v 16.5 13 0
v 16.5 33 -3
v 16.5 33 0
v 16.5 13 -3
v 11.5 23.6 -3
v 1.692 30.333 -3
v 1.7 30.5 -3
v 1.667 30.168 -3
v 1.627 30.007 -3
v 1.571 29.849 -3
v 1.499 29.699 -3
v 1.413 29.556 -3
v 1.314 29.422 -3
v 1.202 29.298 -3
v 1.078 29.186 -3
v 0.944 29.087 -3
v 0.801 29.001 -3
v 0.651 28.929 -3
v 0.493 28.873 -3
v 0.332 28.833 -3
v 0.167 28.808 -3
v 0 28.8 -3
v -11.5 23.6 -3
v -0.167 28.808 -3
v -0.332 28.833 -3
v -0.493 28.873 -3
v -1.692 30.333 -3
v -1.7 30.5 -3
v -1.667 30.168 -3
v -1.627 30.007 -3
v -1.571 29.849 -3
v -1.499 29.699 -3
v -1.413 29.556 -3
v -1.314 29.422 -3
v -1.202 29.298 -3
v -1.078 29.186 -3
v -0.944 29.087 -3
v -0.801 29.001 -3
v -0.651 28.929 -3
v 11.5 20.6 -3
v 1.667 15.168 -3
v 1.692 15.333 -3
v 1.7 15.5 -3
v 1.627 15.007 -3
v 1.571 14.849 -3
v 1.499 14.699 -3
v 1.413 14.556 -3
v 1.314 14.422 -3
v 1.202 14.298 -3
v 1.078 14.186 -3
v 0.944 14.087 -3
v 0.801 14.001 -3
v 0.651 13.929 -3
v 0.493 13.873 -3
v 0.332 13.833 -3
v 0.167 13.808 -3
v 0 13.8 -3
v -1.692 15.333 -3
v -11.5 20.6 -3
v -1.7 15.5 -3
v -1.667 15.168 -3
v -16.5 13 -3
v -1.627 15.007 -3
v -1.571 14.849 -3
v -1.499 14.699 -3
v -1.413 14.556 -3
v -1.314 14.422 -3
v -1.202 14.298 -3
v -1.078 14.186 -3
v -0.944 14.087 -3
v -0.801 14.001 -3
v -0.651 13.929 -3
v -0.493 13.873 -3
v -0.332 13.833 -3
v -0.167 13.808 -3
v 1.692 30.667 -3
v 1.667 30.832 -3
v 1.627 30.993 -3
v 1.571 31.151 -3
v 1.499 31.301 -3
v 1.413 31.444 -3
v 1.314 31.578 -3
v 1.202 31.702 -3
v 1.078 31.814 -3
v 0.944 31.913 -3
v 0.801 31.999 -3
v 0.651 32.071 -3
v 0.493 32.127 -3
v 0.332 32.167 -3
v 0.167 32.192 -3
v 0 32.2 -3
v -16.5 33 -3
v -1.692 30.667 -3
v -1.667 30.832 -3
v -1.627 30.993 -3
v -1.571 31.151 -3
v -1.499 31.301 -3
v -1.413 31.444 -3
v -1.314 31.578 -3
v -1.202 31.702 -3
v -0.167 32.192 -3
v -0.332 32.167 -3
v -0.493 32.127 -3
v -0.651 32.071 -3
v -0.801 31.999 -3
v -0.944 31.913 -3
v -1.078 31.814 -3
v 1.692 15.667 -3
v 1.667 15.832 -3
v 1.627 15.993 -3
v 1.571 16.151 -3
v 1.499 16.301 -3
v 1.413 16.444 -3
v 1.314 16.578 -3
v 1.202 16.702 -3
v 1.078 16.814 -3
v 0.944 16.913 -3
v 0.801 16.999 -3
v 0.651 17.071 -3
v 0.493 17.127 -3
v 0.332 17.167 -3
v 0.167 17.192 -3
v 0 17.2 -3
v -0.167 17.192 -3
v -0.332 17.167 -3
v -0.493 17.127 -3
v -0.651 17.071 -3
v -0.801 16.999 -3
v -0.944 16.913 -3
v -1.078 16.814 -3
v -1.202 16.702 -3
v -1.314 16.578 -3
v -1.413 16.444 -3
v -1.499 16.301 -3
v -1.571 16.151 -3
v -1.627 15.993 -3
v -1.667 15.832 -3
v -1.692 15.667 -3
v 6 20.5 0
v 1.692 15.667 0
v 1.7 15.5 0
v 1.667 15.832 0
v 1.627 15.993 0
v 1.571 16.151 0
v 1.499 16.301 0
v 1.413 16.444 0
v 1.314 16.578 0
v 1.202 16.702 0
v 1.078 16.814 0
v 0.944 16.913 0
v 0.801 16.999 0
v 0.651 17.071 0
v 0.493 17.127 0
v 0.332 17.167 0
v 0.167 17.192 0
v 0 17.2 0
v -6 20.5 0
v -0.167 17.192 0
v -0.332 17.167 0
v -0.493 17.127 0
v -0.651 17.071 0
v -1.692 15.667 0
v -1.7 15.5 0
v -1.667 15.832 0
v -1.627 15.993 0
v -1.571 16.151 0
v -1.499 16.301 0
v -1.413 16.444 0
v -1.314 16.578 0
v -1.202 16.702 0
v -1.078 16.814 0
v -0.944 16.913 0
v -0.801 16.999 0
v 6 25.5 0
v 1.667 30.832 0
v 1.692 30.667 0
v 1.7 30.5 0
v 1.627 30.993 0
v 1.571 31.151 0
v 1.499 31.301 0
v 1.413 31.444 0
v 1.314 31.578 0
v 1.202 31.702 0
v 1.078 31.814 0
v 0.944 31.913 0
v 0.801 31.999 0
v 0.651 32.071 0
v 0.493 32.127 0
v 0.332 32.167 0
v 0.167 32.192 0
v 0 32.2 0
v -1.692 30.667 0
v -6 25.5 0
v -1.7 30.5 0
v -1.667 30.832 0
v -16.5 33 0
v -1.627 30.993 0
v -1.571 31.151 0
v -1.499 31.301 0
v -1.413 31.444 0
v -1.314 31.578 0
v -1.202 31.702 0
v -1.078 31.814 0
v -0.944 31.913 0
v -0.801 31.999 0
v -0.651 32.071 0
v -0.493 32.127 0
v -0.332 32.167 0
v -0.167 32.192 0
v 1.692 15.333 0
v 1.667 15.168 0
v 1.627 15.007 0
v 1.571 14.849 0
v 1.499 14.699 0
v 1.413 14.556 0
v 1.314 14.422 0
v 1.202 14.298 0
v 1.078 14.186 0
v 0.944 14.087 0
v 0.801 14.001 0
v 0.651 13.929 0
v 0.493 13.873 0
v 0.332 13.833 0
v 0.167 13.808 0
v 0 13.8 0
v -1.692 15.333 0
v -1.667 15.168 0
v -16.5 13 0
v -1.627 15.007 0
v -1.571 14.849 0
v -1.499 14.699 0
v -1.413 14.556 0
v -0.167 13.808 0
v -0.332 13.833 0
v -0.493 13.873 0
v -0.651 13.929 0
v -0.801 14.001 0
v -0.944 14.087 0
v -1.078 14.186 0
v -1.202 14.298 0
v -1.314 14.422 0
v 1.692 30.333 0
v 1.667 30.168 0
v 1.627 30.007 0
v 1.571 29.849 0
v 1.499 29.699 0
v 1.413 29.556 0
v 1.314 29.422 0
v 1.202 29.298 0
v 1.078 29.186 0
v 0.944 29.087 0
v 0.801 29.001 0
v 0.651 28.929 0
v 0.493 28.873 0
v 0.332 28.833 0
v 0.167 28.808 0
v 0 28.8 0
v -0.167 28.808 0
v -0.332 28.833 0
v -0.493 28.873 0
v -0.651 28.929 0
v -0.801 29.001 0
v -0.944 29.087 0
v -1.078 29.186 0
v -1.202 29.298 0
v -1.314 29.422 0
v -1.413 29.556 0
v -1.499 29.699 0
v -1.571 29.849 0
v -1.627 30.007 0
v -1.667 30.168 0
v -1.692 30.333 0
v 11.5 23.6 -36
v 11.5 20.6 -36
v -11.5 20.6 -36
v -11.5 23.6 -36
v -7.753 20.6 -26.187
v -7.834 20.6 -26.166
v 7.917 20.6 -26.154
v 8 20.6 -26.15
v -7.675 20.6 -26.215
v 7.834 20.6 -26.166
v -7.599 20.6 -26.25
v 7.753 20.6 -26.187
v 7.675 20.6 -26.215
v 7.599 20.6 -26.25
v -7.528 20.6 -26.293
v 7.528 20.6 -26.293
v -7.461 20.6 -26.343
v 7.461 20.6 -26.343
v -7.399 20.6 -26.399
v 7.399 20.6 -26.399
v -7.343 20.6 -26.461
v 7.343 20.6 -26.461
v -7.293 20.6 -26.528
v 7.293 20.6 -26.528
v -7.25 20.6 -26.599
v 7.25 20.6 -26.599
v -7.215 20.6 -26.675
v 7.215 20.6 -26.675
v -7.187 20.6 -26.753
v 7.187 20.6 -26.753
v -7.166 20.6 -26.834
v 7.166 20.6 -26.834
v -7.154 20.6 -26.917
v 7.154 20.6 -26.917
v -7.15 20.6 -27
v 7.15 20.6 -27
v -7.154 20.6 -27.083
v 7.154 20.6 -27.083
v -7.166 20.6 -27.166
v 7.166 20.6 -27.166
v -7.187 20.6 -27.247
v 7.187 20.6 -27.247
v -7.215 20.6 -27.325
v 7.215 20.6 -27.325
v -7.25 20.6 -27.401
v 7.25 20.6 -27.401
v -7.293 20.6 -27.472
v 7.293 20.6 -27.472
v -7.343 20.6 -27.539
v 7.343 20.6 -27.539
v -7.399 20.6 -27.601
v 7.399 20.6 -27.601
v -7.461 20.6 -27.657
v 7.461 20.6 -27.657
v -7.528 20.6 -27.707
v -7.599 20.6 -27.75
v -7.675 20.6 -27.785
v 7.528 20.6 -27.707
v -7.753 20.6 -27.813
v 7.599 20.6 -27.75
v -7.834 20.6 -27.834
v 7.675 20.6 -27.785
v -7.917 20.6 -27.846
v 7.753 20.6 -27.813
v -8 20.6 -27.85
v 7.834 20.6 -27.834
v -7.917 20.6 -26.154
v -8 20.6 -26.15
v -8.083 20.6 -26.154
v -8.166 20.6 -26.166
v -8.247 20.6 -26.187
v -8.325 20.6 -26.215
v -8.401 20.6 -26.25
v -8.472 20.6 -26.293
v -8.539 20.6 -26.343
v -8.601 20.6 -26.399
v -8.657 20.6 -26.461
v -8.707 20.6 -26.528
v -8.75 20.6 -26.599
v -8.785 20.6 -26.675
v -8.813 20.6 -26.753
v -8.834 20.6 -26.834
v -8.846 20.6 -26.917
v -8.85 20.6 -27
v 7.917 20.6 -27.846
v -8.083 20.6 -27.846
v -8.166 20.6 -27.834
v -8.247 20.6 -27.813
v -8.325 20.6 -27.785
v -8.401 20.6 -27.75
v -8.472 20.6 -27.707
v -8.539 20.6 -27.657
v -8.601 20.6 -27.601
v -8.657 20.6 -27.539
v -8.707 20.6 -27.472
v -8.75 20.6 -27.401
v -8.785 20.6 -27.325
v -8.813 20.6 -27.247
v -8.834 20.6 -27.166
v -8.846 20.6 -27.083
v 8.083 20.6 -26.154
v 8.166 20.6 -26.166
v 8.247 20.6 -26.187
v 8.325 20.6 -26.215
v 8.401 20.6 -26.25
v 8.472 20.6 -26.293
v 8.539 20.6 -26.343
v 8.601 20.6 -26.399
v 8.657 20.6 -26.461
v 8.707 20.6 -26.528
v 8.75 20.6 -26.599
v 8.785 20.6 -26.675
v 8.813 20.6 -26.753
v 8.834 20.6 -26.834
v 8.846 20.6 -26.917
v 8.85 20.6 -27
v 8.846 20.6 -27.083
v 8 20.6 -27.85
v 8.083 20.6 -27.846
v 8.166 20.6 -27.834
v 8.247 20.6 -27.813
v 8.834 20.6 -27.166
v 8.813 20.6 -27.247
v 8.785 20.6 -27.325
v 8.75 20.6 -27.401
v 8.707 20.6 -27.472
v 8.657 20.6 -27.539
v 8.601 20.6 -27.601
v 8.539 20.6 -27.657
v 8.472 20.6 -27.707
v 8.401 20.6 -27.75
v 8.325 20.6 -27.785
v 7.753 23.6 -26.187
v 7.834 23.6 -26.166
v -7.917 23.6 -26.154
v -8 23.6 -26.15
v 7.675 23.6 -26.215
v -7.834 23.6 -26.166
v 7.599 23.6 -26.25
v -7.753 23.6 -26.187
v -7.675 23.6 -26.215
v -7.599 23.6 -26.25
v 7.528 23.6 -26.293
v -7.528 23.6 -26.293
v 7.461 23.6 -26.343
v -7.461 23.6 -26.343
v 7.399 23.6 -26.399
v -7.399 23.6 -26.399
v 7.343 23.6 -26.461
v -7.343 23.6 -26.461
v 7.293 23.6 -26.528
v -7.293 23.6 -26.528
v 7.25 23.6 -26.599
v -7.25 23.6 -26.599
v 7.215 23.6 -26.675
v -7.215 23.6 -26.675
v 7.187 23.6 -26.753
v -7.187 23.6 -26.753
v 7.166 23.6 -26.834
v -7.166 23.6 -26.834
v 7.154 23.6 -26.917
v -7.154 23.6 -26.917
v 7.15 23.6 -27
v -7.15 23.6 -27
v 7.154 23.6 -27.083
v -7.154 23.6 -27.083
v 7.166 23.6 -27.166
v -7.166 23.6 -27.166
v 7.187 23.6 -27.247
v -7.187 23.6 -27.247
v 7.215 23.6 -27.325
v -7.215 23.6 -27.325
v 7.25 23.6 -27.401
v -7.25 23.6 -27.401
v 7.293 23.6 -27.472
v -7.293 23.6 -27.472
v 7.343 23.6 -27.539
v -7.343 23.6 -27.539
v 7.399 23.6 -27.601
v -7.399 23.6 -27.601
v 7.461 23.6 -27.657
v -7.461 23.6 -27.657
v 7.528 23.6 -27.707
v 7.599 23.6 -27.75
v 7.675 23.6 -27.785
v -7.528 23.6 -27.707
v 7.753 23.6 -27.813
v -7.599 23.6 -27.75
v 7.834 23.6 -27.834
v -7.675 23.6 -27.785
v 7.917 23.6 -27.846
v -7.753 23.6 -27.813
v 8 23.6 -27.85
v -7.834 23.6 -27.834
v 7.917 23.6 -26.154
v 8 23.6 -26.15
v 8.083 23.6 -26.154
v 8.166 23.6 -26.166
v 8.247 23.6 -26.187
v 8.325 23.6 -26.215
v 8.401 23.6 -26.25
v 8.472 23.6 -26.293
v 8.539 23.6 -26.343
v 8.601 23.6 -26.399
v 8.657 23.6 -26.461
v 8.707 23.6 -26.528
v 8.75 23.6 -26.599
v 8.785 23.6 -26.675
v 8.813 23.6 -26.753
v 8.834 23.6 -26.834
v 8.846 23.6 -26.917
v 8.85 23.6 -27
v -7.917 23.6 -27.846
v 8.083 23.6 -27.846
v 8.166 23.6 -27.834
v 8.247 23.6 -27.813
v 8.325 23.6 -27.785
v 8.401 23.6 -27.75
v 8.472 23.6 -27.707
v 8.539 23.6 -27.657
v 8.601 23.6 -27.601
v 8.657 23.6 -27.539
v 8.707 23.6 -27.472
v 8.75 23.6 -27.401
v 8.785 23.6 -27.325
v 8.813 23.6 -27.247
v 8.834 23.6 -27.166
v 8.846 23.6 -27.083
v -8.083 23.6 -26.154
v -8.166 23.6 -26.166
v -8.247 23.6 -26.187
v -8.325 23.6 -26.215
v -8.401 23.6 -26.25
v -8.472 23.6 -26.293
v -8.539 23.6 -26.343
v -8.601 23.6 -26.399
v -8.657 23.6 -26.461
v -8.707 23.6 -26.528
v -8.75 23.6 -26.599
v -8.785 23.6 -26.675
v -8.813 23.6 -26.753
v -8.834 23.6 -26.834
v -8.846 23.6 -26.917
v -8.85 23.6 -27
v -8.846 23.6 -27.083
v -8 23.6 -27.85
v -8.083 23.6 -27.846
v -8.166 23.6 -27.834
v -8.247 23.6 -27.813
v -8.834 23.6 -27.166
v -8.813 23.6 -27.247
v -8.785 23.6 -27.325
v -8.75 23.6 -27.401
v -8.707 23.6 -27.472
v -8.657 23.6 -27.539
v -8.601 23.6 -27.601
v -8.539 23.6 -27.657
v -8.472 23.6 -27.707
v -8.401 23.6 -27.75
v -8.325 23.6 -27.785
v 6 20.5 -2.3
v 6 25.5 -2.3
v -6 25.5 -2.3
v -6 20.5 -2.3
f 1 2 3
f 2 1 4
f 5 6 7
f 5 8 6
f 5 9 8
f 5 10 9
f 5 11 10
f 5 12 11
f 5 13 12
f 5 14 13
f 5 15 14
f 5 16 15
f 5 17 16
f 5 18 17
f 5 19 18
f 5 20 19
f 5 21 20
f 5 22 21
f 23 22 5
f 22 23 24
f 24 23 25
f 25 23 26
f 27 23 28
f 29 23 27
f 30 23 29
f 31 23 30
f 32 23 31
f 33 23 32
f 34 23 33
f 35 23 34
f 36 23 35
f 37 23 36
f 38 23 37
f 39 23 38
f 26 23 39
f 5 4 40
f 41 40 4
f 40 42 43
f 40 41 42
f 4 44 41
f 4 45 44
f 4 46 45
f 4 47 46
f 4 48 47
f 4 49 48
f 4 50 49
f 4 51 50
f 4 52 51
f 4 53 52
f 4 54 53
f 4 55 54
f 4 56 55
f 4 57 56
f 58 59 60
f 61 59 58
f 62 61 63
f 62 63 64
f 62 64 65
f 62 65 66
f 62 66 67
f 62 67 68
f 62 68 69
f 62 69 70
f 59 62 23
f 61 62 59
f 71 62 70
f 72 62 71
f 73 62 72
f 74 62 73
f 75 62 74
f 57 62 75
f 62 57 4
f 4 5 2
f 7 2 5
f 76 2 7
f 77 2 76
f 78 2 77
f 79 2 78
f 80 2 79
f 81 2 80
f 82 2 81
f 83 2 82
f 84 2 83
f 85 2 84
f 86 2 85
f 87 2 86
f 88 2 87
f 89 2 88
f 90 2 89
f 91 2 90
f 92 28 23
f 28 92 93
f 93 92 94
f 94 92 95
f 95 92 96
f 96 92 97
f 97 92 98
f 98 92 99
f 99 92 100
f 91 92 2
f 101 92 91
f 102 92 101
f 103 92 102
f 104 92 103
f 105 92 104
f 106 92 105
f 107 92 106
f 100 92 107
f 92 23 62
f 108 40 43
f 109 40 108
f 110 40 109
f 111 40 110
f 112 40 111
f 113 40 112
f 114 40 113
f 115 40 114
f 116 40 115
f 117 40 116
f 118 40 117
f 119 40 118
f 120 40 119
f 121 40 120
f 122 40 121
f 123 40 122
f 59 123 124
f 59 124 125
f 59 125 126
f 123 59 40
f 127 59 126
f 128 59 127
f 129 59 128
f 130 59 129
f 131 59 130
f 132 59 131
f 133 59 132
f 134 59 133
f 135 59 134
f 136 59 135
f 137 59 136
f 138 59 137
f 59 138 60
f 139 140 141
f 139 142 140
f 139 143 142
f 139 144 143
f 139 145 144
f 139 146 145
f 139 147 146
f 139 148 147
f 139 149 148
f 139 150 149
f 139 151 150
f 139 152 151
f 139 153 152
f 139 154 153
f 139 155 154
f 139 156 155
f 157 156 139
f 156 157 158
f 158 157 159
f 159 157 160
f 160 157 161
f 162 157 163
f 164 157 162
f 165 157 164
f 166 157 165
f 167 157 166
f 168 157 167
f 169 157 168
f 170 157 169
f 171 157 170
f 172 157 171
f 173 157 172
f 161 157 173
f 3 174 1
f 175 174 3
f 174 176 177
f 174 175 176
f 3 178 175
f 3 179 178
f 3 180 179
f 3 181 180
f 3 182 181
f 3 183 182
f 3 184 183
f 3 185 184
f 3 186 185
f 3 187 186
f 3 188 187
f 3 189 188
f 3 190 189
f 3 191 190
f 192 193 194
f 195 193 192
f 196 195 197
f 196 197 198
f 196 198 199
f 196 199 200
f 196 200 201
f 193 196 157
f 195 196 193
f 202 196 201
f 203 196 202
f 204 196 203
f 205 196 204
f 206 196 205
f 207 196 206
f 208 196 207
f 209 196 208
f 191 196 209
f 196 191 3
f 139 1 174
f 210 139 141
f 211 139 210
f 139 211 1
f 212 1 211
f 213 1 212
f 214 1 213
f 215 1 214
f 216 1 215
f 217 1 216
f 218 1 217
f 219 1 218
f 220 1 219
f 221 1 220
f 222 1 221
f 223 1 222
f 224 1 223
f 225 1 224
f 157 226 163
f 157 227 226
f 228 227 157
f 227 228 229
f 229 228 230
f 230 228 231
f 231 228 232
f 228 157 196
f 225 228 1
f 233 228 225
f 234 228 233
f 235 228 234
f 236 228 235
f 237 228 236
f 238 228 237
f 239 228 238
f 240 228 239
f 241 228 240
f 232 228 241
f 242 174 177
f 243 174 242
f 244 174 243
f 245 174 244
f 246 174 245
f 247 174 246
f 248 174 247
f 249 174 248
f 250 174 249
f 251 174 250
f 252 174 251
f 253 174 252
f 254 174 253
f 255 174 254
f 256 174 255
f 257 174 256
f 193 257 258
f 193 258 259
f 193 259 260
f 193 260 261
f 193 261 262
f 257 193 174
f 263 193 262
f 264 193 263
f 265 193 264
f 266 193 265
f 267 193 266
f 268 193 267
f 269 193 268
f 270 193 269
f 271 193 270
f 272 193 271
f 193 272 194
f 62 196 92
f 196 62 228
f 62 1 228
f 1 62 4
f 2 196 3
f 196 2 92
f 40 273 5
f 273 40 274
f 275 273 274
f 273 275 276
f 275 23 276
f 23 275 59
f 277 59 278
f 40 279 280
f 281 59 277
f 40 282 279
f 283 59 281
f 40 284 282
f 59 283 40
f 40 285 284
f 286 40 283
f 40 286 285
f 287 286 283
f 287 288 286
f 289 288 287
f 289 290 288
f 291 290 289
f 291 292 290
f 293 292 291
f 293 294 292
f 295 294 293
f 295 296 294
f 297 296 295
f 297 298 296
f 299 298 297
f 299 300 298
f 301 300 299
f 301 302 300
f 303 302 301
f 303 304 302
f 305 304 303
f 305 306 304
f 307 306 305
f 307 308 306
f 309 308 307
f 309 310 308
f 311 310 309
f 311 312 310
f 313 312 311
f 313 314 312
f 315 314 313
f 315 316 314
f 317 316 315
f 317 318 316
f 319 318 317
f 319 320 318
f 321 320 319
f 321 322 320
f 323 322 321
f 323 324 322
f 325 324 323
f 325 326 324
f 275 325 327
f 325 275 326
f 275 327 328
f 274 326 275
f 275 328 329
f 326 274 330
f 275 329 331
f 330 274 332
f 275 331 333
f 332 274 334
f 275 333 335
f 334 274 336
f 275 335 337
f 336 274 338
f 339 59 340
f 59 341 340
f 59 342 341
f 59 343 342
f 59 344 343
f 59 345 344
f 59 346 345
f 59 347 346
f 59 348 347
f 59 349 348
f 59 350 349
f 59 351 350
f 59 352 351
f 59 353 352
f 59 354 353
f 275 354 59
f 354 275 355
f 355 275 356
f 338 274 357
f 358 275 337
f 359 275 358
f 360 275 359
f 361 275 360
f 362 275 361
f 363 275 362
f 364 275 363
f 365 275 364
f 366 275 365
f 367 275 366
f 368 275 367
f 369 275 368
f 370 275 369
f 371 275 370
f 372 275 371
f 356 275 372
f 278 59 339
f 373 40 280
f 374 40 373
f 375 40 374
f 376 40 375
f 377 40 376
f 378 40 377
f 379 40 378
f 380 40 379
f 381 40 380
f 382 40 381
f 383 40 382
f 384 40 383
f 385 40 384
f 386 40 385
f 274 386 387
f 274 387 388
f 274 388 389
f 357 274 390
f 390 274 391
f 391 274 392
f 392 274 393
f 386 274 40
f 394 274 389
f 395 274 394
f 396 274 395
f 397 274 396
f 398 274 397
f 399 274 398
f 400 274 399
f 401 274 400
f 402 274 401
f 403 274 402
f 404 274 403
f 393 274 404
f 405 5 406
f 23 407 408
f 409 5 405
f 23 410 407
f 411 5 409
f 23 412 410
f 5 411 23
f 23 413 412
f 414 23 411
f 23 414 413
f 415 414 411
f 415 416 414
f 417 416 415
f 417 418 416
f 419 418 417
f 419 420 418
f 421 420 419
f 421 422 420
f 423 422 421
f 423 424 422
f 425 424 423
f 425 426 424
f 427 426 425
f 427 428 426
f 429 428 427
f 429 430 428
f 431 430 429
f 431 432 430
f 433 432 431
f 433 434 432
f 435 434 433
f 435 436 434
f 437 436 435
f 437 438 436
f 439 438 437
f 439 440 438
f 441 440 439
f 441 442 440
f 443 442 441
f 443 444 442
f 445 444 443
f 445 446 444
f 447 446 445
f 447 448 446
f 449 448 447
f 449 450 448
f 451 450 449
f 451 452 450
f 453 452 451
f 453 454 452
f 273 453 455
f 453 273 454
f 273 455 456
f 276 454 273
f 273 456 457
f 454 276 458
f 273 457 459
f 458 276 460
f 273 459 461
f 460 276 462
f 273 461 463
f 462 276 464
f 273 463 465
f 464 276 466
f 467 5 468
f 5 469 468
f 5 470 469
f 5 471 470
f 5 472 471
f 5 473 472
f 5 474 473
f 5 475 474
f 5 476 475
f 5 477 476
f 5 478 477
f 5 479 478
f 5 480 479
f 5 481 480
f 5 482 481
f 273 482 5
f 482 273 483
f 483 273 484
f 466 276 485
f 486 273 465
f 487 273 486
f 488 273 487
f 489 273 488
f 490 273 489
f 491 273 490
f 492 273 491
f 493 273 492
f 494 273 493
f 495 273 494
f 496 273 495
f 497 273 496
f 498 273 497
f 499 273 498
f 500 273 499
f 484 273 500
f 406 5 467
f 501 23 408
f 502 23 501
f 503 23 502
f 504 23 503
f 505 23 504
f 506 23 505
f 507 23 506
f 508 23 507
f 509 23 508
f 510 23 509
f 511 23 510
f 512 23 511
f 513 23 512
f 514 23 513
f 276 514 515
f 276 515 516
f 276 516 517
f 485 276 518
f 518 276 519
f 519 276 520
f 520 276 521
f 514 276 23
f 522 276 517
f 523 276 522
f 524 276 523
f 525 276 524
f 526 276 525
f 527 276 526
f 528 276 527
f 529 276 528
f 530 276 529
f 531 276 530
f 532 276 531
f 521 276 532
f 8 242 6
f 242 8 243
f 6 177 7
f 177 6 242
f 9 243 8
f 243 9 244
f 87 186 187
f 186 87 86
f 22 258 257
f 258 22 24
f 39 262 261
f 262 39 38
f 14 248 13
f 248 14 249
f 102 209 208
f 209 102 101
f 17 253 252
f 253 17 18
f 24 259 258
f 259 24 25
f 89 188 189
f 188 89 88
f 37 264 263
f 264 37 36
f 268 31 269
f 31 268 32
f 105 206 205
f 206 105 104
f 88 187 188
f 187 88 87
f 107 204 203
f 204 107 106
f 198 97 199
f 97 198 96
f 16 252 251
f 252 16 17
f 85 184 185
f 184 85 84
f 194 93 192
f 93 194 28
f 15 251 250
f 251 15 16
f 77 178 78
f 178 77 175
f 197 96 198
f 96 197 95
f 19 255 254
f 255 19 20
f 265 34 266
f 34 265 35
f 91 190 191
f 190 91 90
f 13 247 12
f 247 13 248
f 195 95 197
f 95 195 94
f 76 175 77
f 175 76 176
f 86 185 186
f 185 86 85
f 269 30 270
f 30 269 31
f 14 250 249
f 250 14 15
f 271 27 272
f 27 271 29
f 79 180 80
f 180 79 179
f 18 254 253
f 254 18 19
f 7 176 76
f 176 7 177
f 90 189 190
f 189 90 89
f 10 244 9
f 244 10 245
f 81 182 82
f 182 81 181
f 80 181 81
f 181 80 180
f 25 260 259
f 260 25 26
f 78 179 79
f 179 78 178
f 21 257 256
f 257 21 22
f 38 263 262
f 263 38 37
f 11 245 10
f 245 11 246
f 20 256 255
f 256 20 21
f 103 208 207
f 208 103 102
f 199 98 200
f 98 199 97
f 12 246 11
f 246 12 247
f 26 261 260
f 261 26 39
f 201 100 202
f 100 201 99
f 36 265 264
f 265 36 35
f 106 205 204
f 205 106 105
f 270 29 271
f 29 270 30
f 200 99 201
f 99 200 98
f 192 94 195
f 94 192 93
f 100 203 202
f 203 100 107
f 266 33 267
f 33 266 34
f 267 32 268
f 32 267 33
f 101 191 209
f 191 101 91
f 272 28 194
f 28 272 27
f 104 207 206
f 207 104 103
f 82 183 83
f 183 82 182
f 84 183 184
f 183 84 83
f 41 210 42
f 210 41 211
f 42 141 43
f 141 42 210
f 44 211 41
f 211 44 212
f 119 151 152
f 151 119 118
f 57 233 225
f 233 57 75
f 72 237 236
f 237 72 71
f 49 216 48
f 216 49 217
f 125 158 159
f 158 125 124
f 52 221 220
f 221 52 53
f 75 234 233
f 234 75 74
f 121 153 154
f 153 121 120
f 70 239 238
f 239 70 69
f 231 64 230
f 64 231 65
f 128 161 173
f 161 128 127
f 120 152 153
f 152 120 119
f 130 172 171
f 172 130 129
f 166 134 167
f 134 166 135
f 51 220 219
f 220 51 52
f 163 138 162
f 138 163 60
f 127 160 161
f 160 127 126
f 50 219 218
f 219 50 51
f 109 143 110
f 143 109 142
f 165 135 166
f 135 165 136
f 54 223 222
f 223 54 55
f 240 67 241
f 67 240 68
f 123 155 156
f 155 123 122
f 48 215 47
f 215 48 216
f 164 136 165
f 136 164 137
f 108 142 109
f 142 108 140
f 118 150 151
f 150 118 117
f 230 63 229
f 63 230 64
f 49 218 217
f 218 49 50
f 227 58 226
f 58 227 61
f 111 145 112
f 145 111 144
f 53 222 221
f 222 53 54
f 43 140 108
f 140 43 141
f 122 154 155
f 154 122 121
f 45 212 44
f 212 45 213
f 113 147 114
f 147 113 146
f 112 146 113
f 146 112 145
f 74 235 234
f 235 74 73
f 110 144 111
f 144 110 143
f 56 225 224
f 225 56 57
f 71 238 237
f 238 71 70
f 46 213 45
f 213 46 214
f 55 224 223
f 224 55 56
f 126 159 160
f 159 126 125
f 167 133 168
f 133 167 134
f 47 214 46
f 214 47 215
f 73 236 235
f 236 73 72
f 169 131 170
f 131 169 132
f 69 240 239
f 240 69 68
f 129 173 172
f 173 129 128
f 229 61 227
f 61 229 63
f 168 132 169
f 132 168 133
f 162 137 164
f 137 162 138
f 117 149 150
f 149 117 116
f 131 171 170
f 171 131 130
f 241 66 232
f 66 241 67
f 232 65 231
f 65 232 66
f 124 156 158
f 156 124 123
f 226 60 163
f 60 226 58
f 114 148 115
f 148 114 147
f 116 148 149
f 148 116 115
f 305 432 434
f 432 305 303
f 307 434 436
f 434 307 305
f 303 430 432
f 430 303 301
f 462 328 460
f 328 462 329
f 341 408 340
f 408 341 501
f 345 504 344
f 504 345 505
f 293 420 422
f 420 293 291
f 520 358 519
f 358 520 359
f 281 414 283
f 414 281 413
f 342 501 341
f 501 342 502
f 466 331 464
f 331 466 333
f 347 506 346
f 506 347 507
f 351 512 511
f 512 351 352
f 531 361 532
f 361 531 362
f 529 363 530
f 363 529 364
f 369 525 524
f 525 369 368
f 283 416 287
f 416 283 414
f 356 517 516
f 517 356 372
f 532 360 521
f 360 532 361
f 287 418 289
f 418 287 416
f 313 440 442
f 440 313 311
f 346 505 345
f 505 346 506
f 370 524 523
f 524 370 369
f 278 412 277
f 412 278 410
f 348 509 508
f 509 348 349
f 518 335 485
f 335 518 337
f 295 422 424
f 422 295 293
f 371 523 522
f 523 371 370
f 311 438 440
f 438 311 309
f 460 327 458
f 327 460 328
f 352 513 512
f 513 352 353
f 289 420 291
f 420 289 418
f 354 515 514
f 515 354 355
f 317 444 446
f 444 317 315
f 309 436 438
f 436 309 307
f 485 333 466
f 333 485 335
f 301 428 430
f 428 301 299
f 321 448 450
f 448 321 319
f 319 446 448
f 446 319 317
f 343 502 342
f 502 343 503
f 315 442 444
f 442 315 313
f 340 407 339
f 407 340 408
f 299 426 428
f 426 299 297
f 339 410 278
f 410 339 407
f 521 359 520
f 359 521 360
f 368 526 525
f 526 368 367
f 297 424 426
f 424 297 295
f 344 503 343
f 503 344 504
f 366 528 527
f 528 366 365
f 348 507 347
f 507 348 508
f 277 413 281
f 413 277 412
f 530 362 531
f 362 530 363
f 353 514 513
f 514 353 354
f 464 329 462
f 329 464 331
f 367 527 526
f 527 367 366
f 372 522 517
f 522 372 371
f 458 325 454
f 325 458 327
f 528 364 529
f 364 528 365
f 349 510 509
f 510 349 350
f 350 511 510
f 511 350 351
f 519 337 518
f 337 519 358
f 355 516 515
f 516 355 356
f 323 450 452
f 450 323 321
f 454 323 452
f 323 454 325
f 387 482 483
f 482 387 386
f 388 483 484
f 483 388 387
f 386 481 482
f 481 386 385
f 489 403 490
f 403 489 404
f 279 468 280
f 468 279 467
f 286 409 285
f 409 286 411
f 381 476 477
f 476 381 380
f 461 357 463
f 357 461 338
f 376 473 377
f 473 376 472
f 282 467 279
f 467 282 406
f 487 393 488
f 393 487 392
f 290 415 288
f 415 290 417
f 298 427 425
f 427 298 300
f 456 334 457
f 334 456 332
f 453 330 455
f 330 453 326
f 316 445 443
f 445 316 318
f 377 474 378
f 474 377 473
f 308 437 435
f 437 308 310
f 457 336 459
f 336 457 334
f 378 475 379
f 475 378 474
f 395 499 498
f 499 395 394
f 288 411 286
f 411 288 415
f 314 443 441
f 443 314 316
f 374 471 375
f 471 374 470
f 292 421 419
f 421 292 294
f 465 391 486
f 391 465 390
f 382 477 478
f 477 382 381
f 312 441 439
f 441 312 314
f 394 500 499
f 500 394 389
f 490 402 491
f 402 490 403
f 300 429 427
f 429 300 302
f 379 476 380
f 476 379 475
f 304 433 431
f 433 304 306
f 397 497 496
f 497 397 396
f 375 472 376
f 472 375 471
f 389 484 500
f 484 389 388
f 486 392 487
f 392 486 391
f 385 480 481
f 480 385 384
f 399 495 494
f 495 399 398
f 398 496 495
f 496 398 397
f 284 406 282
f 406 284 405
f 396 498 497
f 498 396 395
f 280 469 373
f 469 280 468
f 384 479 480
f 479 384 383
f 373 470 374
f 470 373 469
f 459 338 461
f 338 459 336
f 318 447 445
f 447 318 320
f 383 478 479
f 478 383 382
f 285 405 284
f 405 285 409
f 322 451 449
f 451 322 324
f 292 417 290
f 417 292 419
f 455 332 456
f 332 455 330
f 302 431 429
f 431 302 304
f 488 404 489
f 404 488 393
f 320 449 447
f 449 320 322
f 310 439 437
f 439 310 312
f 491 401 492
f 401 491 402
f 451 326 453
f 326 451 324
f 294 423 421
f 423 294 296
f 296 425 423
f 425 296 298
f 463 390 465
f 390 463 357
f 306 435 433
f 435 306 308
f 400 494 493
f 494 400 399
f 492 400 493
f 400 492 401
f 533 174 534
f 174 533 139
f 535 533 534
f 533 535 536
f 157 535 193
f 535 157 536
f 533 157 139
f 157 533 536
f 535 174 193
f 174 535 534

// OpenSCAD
// Standalone v5 ankle PCB lid: closes the carrier bottom window and
// presents the AS5047P module to the front-axle magnet on a post.
// Assembly: screw the PCB to the post (2 x M2 self-tap) FIRST, slide the
// lid up through the carrier window, drive the 2 x M3 lid screws.
// Edit shared dimensions in frame_v5.scad so everything stays linked.

part_mode = "ankle_pcb_lid";
print_export = true;

include <frame_v5.scad>
